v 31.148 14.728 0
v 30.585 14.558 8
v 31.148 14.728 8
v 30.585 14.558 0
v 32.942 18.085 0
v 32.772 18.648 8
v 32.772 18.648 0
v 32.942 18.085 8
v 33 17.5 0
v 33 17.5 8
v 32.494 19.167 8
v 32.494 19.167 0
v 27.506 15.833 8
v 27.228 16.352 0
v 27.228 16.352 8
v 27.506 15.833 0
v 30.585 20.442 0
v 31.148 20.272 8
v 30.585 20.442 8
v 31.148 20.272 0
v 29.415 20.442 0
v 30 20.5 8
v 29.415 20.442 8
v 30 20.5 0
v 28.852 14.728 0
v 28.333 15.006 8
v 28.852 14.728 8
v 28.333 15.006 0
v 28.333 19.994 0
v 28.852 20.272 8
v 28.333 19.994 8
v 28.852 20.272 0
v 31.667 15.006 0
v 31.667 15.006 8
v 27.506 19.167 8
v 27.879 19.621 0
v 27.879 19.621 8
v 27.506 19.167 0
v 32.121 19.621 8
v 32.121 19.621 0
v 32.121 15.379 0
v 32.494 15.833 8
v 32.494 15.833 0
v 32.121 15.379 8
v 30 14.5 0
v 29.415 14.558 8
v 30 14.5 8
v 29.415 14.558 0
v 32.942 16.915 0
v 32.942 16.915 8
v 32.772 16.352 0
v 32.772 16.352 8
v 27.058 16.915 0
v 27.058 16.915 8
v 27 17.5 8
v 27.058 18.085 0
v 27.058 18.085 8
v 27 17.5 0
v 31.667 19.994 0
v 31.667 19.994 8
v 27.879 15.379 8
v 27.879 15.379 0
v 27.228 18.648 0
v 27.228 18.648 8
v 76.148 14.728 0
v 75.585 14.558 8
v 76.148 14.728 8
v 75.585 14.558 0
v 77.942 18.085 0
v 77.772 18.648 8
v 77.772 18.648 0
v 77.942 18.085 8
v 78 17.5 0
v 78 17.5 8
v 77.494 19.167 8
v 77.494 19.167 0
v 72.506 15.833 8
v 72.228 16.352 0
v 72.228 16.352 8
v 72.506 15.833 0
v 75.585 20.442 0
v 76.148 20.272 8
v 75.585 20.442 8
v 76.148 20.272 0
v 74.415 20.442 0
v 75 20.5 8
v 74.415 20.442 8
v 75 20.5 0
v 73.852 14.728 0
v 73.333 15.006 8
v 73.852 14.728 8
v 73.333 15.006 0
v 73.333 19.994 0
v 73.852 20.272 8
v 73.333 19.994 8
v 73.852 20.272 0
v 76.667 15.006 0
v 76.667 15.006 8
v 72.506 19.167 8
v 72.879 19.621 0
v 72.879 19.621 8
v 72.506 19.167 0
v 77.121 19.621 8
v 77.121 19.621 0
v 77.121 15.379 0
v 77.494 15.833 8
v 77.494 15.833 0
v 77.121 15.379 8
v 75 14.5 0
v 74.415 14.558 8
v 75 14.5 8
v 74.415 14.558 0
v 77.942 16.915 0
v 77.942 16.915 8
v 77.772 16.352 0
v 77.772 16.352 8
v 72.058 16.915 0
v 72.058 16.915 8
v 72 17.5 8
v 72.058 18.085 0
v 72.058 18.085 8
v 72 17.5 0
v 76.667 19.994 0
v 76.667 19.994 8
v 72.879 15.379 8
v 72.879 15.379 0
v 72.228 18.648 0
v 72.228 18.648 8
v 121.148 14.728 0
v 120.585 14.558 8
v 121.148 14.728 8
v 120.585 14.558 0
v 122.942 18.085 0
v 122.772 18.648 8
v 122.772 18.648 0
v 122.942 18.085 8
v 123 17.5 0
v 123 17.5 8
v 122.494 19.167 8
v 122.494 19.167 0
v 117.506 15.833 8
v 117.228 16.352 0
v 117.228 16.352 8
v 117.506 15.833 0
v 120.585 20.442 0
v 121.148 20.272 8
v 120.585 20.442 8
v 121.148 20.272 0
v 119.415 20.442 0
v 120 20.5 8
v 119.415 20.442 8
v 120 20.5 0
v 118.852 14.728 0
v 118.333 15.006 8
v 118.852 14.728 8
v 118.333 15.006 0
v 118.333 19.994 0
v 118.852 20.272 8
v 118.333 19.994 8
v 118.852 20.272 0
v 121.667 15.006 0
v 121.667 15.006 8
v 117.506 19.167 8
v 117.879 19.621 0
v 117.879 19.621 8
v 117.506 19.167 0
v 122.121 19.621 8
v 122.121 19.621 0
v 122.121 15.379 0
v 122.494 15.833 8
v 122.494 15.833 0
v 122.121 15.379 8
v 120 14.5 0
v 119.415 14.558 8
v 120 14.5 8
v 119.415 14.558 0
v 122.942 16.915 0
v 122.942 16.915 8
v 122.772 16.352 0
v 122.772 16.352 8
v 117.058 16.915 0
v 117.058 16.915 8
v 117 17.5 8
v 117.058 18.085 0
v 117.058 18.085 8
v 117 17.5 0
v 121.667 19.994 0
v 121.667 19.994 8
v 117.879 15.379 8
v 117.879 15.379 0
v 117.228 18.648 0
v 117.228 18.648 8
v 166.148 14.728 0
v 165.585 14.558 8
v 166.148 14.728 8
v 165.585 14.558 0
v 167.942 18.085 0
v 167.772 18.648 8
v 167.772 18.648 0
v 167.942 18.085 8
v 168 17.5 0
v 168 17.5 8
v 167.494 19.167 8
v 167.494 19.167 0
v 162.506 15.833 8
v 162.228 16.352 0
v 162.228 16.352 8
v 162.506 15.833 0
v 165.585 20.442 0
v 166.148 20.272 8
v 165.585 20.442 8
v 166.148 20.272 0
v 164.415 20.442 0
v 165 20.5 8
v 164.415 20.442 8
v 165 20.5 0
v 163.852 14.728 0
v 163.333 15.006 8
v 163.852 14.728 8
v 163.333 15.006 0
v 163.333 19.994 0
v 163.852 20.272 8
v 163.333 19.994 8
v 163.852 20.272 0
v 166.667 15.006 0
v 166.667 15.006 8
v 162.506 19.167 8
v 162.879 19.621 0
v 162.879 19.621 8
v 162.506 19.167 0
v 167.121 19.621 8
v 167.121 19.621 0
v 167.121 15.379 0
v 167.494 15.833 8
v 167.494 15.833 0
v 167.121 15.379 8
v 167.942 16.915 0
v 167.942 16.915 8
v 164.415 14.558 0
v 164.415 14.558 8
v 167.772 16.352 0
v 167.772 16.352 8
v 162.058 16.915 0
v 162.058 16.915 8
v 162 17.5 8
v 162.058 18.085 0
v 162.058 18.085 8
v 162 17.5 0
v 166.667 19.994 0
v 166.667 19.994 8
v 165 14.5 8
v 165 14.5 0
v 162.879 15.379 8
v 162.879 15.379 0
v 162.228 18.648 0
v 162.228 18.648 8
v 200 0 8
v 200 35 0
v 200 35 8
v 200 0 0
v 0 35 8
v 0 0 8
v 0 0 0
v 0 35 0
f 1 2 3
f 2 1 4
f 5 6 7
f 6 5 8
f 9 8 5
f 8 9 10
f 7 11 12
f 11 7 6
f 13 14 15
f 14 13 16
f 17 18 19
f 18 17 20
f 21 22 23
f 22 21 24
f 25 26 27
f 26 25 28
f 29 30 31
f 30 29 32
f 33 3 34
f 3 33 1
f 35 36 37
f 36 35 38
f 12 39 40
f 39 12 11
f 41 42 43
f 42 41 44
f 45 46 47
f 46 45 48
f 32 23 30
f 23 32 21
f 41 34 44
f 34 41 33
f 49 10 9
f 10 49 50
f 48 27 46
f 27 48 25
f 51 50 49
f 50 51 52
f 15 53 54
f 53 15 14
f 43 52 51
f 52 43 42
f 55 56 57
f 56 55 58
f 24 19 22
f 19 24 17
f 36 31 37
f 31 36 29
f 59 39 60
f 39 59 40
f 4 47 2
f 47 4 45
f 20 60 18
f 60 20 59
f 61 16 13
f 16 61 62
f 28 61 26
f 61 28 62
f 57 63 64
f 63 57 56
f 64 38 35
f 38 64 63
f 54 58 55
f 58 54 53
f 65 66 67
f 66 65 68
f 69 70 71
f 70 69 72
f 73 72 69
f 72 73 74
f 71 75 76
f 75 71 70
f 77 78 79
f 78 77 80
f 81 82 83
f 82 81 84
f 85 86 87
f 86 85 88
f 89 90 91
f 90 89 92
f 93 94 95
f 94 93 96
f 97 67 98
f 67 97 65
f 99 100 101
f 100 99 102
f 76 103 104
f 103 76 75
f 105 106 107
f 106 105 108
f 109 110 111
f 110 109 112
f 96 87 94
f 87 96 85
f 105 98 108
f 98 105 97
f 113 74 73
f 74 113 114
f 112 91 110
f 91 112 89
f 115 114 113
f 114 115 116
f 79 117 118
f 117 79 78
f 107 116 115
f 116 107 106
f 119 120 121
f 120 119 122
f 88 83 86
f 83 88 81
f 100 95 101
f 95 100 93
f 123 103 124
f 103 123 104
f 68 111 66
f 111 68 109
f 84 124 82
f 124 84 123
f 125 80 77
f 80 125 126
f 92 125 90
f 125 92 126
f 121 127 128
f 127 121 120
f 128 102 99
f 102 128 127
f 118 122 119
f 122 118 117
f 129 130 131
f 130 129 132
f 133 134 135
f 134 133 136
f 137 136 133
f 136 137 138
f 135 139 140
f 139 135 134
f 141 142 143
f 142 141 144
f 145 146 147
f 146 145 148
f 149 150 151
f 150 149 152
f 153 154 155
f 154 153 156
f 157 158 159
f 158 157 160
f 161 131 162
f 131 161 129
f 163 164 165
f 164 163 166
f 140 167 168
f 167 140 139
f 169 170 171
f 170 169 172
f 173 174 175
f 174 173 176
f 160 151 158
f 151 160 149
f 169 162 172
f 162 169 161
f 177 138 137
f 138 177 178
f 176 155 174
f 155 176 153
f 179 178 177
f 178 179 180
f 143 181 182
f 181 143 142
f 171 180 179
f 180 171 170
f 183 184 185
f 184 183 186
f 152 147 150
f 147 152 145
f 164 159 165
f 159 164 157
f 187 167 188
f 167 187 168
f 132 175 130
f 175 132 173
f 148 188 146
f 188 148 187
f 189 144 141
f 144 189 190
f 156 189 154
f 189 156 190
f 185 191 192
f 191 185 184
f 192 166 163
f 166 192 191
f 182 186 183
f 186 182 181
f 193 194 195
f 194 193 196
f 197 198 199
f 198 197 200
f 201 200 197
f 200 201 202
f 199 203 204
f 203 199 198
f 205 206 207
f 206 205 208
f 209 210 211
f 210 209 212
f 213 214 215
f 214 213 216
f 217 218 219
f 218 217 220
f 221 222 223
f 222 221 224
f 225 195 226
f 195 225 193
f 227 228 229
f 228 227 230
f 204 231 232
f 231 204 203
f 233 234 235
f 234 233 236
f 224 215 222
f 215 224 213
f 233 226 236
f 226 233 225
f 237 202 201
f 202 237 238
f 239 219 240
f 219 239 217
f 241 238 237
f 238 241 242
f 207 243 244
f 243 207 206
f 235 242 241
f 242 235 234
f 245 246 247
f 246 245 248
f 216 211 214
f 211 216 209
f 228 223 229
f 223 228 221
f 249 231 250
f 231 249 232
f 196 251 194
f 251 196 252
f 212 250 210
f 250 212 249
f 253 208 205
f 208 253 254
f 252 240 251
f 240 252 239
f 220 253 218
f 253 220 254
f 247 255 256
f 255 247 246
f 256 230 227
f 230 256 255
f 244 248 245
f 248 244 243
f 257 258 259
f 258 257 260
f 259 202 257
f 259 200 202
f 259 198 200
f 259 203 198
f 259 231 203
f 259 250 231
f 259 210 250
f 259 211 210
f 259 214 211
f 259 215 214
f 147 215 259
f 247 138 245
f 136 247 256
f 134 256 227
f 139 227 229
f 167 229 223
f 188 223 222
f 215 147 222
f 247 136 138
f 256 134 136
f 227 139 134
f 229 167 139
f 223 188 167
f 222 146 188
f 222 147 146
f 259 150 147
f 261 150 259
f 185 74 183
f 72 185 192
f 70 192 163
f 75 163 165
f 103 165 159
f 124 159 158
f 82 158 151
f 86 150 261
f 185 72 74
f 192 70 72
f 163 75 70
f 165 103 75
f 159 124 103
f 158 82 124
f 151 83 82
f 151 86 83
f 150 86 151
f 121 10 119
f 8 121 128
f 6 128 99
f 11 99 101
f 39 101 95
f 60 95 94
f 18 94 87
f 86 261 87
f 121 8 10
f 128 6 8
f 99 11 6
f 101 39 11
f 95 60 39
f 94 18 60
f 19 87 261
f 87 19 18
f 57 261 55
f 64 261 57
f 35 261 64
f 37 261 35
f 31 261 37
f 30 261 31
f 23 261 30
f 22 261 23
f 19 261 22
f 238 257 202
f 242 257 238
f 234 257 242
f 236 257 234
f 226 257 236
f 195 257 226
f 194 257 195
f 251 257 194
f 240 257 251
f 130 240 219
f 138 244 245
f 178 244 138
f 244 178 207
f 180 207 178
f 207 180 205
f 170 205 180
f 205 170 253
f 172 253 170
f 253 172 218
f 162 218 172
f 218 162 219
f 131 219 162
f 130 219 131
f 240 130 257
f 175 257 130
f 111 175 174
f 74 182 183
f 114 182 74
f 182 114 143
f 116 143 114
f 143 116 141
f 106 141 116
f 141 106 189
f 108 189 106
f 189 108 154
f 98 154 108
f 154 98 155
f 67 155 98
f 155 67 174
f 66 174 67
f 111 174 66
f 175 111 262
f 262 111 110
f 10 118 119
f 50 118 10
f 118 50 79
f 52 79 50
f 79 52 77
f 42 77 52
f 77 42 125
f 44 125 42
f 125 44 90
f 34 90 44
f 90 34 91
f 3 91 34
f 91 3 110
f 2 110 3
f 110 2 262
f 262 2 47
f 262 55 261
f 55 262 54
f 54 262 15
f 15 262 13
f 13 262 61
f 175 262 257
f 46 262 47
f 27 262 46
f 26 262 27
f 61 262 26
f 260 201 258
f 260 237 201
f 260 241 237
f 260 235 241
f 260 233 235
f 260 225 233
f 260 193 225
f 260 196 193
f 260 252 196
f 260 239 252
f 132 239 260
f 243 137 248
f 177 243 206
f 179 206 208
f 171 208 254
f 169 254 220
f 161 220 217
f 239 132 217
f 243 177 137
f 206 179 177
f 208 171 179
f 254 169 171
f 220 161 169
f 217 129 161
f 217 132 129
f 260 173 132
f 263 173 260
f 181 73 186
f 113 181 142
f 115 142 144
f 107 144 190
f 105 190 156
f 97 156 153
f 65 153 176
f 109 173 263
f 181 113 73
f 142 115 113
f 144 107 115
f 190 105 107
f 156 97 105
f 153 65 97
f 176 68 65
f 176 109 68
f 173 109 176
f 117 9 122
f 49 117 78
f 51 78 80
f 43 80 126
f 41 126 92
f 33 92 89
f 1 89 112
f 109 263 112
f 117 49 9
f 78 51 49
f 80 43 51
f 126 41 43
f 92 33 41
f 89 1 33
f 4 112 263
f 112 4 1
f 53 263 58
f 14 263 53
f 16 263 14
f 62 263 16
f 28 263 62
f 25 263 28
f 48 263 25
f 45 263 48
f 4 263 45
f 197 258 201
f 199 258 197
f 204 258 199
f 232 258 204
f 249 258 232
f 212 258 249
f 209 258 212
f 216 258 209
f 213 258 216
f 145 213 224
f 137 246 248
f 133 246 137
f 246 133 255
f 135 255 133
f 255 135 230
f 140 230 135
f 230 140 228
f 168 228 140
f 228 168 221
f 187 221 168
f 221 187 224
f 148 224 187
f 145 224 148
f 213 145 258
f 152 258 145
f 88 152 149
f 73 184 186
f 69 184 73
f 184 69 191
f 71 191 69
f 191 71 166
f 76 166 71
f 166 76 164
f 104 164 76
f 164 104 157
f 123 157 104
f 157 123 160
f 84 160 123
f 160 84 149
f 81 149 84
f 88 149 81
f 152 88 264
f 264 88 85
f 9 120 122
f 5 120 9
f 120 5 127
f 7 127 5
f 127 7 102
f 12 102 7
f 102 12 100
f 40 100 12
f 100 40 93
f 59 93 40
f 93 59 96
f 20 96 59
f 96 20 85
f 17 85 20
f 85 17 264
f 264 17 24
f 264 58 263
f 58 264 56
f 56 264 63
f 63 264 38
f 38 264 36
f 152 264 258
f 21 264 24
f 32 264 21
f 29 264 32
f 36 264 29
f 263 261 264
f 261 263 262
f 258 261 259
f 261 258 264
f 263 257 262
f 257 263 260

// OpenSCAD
$fn = 32;

// ----------------------------------------------------------------------
// Long rail: 200-250 mm mounting rail
// ----------------------------------------------------------------------

// --- parameters (mm) ---
rail_l = 200;             // rail length, X
rail_w = 35;              // rail width, Y
rail_t = 8;               // rail thickness, Z
hole_d = 6;               // mounting hole diameter
hole_start = 30;          // first hole offset from the end
hole_pitch = 45;          // hole pitch
holes = 4;                // number of holes
fit_tol = 0.1;            // tolerance for press fits, mm
free_tol = 0.3;           // tolerance for clearance fits, mm

difference() {
  cube([rail_l, rail_w, rail_t]);
  for (i = [0 : holes - 1])
    translate([hole_start + i * hole_pitch, rail_w / 2, -1])
      cylinder(h = rail_t + 2, d = hole_d);
}
